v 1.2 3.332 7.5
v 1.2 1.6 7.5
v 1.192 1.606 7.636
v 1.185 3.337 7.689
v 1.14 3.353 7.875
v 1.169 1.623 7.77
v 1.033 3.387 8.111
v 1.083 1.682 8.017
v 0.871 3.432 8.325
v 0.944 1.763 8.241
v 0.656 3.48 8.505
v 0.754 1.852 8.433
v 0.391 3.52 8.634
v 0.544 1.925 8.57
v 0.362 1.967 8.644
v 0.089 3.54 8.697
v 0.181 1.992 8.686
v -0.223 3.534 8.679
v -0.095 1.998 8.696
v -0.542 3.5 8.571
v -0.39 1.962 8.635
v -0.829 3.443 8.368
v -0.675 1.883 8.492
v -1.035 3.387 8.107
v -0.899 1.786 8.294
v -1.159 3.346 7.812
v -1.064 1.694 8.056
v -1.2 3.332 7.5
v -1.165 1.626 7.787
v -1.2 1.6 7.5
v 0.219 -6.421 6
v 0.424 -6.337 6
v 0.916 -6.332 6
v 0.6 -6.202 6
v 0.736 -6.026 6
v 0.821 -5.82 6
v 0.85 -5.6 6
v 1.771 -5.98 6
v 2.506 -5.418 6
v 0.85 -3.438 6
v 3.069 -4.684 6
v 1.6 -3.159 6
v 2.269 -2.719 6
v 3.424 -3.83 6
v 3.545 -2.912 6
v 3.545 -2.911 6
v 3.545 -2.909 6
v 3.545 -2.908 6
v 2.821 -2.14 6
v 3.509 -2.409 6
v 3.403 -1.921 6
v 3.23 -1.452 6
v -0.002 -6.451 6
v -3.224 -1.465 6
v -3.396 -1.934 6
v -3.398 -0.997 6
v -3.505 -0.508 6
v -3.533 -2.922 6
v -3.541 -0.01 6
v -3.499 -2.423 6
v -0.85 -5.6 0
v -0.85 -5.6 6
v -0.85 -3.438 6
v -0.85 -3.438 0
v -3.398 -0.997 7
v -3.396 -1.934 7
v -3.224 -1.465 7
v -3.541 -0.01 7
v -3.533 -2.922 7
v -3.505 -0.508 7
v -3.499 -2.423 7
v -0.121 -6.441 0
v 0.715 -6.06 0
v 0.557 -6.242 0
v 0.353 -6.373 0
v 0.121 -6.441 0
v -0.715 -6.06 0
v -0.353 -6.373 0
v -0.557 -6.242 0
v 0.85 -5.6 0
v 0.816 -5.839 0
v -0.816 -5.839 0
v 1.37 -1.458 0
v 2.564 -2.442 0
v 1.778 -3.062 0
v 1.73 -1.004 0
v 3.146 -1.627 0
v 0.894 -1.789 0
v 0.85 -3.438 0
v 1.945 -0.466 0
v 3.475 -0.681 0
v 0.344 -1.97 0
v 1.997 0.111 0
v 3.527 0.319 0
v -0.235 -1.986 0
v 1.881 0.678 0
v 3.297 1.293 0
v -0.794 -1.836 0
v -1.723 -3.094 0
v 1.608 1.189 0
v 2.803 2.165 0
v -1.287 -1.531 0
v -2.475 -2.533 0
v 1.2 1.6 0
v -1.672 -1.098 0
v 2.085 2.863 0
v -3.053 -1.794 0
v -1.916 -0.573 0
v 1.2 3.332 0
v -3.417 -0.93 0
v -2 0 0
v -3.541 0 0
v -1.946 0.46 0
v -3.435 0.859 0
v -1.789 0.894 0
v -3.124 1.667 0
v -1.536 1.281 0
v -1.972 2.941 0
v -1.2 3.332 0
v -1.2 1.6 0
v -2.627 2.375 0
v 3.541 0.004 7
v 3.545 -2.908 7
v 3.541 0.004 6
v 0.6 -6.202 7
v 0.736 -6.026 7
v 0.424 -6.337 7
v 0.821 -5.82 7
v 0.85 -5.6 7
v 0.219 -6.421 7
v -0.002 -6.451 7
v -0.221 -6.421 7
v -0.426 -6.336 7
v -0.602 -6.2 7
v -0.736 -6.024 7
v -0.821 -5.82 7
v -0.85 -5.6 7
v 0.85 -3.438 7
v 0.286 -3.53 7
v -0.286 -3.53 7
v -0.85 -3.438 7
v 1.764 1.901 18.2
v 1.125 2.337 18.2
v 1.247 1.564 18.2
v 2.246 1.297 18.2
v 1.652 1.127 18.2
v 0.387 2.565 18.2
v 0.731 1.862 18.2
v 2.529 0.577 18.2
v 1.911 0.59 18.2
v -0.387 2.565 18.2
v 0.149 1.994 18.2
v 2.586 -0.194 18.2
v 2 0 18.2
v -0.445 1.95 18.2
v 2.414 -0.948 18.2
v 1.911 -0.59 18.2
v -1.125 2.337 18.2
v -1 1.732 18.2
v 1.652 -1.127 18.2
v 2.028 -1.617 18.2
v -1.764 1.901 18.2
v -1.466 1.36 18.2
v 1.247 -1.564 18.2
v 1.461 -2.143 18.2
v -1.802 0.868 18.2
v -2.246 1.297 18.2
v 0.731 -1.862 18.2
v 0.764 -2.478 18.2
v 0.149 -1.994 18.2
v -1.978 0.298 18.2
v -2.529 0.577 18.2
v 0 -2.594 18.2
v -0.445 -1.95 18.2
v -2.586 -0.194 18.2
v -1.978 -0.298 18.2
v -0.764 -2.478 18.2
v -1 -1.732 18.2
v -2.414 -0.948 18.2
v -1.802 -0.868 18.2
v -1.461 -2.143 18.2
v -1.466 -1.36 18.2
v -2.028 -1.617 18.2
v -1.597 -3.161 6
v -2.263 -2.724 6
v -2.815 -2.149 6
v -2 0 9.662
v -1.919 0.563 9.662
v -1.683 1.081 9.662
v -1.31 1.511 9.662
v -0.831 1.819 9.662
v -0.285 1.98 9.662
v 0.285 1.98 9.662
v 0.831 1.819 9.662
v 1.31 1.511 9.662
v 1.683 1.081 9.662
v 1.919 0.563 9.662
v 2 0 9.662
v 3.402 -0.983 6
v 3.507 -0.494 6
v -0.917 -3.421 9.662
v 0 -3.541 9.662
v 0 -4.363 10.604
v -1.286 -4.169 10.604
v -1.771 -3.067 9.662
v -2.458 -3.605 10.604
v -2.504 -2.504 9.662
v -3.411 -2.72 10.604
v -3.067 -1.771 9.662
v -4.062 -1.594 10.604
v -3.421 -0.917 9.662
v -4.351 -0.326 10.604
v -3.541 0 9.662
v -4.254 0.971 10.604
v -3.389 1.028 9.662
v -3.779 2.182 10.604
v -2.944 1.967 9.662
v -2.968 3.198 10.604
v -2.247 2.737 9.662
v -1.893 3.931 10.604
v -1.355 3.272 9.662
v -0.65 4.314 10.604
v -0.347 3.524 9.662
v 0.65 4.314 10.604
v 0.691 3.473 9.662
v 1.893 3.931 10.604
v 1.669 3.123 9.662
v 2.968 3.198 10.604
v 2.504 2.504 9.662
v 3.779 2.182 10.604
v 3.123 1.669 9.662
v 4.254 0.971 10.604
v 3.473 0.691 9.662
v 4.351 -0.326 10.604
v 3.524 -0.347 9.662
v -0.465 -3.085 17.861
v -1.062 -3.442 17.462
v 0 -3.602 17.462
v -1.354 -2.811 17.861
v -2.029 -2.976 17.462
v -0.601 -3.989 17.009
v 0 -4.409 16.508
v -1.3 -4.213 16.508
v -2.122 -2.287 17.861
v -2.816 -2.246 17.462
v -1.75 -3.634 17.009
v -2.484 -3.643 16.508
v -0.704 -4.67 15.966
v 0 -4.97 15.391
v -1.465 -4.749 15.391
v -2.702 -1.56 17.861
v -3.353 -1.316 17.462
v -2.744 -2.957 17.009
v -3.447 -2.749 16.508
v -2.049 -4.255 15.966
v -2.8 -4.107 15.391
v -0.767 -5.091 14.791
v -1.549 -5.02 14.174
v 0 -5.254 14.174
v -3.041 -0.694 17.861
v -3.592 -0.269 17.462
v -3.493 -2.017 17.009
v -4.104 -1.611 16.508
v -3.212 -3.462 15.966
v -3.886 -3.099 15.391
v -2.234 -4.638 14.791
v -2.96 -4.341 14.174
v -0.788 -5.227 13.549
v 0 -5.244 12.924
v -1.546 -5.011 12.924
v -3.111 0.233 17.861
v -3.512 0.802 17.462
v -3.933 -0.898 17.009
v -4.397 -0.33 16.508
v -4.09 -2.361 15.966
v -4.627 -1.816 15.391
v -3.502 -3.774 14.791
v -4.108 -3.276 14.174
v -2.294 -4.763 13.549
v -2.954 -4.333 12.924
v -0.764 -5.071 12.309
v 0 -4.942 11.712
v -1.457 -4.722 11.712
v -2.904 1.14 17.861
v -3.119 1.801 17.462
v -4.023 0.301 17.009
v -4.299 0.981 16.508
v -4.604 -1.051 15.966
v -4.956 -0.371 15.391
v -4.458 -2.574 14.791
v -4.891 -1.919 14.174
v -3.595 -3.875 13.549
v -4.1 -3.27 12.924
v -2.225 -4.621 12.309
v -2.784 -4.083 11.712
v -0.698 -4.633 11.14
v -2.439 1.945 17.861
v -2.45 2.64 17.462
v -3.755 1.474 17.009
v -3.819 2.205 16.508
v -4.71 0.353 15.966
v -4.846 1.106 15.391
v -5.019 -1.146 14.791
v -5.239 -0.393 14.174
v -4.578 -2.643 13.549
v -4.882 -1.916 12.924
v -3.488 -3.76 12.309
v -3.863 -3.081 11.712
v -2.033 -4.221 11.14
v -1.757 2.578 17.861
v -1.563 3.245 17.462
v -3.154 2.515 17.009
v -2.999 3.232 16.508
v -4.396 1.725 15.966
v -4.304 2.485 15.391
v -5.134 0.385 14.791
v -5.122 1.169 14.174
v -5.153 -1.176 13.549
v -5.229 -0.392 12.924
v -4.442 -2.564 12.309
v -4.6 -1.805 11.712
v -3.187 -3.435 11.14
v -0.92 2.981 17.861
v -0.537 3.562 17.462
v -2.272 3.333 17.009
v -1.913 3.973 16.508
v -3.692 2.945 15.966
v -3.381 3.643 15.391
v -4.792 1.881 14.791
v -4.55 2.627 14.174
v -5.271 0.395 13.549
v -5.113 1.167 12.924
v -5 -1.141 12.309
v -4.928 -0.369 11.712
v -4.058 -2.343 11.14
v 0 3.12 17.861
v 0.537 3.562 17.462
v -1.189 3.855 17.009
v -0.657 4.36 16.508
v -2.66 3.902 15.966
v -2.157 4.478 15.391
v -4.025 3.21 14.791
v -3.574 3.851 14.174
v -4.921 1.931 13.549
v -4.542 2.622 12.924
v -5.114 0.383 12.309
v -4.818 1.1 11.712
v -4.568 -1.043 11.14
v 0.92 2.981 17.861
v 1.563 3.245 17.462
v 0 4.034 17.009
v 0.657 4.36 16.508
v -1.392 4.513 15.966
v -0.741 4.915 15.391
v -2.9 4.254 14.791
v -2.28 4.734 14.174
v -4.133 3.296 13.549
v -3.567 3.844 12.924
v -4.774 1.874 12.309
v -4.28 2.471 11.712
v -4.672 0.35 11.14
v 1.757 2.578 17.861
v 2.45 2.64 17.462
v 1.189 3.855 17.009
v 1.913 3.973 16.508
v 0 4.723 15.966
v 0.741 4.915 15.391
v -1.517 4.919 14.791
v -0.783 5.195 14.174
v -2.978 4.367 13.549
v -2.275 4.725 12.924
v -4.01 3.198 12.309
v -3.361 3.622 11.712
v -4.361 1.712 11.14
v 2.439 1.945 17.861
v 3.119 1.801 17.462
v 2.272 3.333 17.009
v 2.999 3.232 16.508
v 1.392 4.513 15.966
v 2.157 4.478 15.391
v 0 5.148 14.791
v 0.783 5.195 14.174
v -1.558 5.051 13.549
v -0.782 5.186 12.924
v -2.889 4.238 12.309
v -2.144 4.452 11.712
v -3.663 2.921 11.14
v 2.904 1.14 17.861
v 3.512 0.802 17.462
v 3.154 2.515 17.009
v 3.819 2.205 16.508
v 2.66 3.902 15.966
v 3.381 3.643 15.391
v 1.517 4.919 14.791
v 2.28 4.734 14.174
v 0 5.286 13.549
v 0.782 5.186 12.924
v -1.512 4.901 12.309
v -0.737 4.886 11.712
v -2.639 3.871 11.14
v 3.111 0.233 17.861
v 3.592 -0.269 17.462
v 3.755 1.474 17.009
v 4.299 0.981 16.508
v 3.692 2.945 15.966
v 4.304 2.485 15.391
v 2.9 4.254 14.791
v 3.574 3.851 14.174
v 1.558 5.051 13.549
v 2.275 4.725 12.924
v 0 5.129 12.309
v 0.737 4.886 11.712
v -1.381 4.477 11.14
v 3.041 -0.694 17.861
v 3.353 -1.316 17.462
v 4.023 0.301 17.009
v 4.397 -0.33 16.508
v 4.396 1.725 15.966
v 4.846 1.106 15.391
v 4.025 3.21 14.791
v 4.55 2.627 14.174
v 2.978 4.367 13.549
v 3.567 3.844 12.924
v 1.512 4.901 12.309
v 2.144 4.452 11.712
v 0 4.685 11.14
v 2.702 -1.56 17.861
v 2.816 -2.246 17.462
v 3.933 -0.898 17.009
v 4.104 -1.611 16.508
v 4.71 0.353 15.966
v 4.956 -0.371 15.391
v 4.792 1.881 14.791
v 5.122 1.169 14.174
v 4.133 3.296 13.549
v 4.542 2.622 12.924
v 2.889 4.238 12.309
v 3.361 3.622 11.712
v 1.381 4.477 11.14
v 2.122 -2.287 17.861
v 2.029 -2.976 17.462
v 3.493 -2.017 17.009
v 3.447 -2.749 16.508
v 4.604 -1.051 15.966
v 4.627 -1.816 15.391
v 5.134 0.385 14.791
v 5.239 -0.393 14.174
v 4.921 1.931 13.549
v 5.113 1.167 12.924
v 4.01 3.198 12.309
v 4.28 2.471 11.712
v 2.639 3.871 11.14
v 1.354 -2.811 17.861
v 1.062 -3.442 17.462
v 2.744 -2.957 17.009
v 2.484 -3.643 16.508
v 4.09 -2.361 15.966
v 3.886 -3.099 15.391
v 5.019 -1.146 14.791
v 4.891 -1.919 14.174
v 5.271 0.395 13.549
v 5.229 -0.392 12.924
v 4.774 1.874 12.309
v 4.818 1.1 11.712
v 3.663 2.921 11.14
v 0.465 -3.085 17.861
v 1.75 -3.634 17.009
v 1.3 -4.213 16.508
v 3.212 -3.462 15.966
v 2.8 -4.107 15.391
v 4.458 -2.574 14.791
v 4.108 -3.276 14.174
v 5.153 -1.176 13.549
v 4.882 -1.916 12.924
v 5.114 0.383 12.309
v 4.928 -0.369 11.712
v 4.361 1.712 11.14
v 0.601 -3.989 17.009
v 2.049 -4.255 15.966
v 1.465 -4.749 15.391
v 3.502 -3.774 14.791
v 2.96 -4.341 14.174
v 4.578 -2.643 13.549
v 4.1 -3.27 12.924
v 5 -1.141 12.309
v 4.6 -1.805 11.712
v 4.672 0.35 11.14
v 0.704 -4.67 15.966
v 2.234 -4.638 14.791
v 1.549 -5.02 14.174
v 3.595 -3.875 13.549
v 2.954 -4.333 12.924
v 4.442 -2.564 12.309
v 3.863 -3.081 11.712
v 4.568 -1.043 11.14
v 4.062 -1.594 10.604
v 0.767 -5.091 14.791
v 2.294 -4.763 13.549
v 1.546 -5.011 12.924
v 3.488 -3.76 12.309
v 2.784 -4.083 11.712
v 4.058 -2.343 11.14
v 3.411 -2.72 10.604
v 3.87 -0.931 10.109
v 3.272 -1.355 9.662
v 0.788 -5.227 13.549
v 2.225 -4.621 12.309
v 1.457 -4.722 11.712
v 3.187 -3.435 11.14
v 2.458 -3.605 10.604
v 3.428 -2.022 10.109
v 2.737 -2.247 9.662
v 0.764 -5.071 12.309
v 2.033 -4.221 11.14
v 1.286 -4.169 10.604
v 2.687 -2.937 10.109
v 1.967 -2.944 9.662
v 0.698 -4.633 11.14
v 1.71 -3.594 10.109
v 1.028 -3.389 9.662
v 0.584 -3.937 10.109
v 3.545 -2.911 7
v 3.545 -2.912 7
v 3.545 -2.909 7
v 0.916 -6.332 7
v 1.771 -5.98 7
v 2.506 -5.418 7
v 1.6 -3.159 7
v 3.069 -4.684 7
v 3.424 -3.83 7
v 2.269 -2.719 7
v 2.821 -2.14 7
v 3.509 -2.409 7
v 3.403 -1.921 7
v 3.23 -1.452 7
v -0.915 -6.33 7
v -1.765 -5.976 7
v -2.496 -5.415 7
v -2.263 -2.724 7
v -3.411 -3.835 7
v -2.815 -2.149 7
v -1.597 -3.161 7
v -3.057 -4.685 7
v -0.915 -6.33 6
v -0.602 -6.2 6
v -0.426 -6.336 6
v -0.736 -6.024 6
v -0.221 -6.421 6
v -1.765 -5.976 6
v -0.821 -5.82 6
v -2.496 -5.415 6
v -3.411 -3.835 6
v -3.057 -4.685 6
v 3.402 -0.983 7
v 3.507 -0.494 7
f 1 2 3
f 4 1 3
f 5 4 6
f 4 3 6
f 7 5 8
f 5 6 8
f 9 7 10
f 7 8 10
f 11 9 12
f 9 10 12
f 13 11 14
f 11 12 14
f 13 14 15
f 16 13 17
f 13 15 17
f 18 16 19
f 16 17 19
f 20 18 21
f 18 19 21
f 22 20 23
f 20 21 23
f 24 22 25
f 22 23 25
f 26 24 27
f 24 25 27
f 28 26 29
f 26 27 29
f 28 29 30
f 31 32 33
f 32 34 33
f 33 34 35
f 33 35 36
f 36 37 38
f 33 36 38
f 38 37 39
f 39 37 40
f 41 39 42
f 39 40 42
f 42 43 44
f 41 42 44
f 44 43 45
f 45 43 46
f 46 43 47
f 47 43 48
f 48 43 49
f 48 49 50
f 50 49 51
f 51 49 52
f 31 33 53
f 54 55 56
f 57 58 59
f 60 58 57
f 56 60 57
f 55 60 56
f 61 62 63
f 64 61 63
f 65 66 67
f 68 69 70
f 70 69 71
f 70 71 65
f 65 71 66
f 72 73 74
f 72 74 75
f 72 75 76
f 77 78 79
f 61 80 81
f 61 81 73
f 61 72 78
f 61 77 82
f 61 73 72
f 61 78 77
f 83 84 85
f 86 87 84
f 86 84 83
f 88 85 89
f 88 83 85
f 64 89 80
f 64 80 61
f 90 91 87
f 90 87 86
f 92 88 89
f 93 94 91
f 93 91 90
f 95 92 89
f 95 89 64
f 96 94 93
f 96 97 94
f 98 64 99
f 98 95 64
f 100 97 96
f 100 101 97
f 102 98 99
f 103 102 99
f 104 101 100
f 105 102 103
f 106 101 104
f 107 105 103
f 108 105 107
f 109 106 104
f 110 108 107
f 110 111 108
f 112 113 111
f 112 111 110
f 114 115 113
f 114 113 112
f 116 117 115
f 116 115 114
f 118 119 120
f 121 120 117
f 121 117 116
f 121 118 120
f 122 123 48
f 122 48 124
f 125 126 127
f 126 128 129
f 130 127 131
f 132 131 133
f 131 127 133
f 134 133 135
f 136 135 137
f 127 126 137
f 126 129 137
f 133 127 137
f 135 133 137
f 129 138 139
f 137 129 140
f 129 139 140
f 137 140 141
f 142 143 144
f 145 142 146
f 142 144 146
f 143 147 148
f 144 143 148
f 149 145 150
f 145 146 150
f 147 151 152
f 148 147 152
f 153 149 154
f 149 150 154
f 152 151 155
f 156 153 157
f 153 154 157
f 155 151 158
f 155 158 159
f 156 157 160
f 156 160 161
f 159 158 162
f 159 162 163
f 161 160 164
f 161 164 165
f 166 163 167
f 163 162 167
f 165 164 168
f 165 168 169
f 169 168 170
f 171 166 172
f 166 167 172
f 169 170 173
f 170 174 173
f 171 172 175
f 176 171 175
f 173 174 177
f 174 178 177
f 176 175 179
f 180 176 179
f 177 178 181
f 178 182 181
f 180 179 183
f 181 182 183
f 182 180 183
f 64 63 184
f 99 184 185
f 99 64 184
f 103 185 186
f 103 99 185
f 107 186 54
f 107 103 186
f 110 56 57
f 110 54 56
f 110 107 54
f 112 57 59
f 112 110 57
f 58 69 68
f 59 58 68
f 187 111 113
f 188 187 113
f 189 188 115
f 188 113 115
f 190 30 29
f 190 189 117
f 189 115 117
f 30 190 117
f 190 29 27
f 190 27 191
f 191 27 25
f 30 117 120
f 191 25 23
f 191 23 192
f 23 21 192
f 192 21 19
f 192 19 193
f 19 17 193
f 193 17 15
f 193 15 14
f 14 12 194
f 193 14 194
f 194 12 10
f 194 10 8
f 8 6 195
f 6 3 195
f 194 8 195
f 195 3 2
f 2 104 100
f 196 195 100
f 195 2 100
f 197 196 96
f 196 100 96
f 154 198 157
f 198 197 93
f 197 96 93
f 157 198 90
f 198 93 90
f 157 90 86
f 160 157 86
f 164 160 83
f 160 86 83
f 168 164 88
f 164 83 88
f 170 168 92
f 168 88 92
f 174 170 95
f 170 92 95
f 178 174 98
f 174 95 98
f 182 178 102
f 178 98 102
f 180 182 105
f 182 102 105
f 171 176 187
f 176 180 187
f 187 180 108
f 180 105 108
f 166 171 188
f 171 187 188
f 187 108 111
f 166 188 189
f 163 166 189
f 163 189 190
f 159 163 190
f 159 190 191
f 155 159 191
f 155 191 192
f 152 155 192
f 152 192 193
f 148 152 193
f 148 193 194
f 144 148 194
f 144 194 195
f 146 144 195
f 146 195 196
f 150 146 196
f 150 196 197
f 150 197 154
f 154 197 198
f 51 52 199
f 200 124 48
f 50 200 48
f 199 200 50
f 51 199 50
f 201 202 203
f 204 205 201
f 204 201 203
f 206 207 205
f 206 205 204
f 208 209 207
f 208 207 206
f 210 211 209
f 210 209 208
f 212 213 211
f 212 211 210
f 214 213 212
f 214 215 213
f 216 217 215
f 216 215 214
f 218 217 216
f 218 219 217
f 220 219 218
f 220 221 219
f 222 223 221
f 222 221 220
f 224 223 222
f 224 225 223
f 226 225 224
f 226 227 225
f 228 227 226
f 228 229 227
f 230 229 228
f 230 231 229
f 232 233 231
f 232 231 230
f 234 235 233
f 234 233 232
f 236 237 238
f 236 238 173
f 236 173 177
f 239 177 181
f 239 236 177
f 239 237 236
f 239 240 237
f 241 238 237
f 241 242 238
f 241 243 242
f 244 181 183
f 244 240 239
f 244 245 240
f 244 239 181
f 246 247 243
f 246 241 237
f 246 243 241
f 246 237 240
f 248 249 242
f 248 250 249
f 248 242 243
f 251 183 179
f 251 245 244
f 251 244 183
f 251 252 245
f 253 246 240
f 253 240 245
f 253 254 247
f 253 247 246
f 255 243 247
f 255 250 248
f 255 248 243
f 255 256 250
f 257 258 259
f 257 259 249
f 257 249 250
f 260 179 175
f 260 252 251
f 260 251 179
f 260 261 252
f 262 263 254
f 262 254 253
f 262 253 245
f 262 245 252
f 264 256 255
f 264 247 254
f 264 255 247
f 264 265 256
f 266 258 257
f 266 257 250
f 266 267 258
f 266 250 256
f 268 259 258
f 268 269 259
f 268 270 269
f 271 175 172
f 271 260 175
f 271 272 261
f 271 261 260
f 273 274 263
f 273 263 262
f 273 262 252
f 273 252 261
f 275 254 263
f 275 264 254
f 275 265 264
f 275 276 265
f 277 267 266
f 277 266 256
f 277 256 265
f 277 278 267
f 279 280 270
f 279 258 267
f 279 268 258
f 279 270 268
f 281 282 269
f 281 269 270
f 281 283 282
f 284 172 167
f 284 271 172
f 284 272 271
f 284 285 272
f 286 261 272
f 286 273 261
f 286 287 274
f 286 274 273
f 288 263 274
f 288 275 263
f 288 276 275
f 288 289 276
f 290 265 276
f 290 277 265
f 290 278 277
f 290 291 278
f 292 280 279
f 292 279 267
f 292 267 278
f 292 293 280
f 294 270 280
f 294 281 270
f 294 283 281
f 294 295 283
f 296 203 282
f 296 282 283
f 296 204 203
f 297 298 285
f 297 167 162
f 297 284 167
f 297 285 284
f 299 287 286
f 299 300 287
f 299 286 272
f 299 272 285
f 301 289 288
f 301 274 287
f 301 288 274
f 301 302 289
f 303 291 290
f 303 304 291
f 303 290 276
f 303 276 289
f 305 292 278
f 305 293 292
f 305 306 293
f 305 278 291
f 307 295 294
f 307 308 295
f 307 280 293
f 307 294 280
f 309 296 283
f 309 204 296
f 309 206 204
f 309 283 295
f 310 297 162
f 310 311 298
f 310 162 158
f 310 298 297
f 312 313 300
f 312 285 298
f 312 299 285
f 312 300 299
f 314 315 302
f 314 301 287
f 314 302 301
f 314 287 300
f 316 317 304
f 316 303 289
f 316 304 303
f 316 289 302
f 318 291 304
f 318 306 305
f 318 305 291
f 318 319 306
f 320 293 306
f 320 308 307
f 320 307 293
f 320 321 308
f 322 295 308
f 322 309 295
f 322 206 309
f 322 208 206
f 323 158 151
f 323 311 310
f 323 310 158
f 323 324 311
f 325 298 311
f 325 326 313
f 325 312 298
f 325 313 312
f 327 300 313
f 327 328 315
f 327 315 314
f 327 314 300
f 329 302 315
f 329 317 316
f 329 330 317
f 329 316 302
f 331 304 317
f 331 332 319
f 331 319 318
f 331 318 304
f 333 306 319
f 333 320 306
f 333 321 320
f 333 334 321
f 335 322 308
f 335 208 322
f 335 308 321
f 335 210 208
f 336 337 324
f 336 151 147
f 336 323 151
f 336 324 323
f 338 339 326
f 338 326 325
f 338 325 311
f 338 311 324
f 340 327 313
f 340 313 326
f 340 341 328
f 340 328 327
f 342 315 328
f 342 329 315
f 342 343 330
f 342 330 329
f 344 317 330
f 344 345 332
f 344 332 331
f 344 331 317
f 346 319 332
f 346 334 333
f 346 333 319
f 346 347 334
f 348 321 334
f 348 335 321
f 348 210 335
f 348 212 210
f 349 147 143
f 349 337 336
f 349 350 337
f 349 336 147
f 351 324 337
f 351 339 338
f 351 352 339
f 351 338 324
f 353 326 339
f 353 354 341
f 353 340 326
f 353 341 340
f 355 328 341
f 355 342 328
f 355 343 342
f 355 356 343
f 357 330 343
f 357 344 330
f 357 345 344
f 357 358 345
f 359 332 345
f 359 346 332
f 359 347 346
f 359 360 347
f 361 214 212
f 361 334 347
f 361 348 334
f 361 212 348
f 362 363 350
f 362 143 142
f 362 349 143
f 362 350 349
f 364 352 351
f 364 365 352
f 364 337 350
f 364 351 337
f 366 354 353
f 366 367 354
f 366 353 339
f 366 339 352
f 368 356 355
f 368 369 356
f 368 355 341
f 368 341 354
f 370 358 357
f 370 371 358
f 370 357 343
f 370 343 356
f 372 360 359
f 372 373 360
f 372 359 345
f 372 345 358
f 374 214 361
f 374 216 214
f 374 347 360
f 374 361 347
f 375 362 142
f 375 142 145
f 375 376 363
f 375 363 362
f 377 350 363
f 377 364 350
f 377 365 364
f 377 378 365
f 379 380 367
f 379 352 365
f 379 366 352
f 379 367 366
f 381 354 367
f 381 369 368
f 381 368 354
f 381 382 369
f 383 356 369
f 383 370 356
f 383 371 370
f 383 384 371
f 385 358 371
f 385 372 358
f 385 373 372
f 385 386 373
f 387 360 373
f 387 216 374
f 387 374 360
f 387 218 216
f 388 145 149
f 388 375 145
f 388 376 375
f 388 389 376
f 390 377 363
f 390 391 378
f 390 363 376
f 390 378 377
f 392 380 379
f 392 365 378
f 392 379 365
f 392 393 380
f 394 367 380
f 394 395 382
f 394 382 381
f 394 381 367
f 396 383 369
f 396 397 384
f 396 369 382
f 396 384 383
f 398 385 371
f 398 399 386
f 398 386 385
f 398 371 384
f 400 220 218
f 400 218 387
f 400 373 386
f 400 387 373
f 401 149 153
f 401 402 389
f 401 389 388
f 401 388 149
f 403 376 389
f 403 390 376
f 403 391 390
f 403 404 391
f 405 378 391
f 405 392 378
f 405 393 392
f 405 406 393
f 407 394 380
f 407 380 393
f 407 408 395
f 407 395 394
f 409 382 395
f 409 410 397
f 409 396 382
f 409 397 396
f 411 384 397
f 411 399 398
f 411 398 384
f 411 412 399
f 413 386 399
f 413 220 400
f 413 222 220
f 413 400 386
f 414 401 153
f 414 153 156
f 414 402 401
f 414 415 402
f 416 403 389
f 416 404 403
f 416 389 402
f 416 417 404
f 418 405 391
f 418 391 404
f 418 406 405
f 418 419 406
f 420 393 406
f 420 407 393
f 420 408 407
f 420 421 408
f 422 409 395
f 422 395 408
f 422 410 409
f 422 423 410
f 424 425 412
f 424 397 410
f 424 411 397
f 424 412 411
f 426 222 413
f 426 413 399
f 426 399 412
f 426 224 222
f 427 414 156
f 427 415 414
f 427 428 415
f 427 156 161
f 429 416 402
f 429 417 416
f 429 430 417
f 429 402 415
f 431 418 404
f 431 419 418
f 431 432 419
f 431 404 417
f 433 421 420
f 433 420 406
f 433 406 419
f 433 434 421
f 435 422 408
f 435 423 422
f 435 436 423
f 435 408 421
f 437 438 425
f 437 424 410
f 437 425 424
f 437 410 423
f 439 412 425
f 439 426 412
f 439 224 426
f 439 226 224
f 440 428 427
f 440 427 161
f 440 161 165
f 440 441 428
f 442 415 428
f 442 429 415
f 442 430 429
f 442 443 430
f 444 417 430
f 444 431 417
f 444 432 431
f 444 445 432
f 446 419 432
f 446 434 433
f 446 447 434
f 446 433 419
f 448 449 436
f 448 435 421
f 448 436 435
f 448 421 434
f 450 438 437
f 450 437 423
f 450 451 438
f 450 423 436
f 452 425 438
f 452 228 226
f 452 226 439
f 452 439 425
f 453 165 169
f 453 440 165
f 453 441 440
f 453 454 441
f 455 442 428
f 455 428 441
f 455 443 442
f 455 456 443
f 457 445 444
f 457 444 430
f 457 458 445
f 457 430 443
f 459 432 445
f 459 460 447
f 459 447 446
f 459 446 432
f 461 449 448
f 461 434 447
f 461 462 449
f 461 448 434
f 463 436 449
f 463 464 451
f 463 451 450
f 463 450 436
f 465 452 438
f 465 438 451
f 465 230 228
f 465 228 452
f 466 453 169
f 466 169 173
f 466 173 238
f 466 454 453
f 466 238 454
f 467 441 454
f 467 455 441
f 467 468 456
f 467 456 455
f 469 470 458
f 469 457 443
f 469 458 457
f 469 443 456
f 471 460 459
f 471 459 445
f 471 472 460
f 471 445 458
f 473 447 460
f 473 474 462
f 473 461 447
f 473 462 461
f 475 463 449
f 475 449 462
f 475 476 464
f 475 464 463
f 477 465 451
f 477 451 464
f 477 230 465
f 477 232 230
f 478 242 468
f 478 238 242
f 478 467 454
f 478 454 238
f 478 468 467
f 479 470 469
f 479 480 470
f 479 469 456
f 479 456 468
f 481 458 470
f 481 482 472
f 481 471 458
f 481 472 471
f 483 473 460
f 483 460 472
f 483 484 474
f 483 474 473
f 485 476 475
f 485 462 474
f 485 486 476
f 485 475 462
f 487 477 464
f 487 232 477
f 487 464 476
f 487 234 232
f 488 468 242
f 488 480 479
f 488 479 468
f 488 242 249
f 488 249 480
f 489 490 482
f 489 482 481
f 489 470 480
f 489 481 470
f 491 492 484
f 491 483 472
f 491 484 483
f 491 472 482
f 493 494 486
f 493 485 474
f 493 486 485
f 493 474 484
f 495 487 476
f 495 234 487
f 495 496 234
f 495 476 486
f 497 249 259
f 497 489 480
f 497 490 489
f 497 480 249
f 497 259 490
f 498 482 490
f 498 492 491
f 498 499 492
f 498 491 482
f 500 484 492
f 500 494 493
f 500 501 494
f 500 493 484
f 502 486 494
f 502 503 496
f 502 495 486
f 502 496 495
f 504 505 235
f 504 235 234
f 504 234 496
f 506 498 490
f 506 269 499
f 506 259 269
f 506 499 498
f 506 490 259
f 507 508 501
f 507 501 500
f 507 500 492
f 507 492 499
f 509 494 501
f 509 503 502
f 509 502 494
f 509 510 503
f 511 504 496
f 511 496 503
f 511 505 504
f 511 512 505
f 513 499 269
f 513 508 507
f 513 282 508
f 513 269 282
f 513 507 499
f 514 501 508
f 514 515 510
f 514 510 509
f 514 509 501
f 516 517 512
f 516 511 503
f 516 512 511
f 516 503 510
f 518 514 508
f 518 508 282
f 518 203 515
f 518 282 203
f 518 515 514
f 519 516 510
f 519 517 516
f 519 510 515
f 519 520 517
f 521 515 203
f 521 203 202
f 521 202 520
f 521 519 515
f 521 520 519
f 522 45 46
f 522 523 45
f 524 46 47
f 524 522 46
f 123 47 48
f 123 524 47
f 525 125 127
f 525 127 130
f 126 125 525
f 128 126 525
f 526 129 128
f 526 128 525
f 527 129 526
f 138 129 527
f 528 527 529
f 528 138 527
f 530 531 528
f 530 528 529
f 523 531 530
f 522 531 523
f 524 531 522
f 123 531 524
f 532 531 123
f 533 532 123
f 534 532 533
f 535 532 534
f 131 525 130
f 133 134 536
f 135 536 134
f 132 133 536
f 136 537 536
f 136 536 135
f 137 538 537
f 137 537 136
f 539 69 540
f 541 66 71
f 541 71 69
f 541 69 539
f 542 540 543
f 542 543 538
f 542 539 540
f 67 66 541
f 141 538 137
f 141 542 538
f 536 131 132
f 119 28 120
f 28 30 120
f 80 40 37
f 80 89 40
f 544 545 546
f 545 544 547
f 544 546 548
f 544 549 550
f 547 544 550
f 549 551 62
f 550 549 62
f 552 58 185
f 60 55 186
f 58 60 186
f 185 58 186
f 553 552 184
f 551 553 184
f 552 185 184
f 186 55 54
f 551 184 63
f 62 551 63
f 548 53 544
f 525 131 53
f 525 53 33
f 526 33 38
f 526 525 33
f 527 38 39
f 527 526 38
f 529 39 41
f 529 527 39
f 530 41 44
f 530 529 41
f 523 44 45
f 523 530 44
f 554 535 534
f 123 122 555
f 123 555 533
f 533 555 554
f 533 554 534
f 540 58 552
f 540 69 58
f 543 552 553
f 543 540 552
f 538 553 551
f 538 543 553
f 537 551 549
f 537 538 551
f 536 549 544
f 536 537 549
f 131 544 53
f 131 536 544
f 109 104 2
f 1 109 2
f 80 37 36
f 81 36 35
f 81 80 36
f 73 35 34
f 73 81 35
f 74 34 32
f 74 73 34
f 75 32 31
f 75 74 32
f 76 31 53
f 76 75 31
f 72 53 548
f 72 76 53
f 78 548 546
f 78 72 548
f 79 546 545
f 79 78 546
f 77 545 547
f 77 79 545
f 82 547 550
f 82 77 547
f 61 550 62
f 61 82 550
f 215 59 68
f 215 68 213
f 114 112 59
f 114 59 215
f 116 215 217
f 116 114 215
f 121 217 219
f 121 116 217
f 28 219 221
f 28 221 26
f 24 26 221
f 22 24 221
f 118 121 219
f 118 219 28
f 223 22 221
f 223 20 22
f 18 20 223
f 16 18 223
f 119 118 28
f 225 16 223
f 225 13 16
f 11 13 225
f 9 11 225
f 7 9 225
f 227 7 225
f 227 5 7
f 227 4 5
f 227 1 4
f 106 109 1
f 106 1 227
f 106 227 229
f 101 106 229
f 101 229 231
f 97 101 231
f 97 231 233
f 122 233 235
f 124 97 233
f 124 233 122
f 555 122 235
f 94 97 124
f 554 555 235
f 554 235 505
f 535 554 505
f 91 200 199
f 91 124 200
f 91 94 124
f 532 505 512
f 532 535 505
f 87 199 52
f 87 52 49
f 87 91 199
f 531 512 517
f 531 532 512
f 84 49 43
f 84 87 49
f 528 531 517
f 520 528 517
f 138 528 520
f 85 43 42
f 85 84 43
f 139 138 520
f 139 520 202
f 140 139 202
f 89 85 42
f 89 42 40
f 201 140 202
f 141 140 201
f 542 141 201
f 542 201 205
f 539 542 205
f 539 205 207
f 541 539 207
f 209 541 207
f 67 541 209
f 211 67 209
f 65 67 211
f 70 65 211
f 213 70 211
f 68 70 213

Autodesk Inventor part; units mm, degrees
ref_plane "YZ Plane" through (0, 0, 0) normal (1, 0, 0) x (0, 1, 0)
ref_plane "XY Plane" through (0, 0, 0) normal (0, 0, 1) x (1, 0, 0)
sketch "Náčrt2" plane through (0, 0, 0) normal (1, 0, 0) x (0, 1, 0)
  line L0 (-2.5936, 18.2) -> (2.6216, 18.2) projected
  line L1 (-6.458, 6.9989) -> (0.6548, 6.9989) projected
  line L2 (-3.5412, 9.6623) -> (3.7182, 9.6623) projected
  line L3 (0, 18.2) -> (0, 9.6623)
  arc A0 (-2.5936, 18.2) -> (-3.5412, 9.6623) centre (0.0066, 13.59) ccw
  line L4 (0, 18.2) -> (0, 0)
revolve "Rotace1" add sketch "Náčrt2" angle 360 about axis through (0, 0, 18.2) along (0, 0, -1)
sketch "Náčrt3" plane through (0, 0, 18.2) normal (0, 0, 1) x (1, 0, 0)
  circle A0 centre (0, 0) radius 2
  dimension "d1" = 4
extrude "Vysunutí1" cut sketch "Náčrt3" against normal blind 10
sketch "Náčrt4" plane through (-3.5364, -0.0875, 0) normal (0, 0, -1) x (-1, 0, 0)
  circle A0 centre (-3.5364, 0.0875) radius 3.5412 projected
  circle A1 centre (-3.5364, 0.0875) radius 2 projected
  line L0 (-2.6864, -5.5125) -> (-2.6864, -3.3464) projected
  circle A2 centre (-3.5364, -5.5125) radius 0.85 projected
  line L1 (-4.3864, -3.3464) -> (-4.3864, -5.5125) projected
  point P0 (-3.5364, 0.0875)
  point P1 (-4.3864, -3.3502)
  point P2 (-2.6864, -3.3502)
extrude "Vysunutí2" add sketch "Náčrt4" against normal blind 10 contours A0
sketch "Náčrt5" plane through (-3.5364, -0.0875, 0) normal (0, 0, -1) x (-1, 0, 0)
  point P0 (-3.5364, 0.0875)
extrude "Vysunutí3" add sketch "Náčrt4" against normal blind 7 contours A0 L0 A2 L1 | A2
sketch "Náčrt6" plane through (0, 0, 0) normal (0, 1, 0) x (-1, 0, 0)
  line L0 (0, 0) -> (-1.2, 0)
  line L1 (2, 0) -> (-2, 0) projected
  line L2 (-1.2, 0) -> (-1.2, 7.5)
  line L3 (-1.2, 7.5) -> (1.2, 7.5)
  line L4 (1.2, 7.5) -> (1.2, 0)
  arc A0 (1.2, 7.5) -> (-1.2, 7.5) centre (0, 7.5) ccw
  line L5 (0, 0) -> (1.2, 0)
  line L6 (-1.2, 7.5) -> (1.2, 7.5)
  line L7 (-1.2, 0) -> (1.2, 0)
  line L8 (1.2, 7.5) -> (1.2, 0)
  line L9 (1.2, 7.5) -> (-1.2, 7.5)
  line L10 (-1.2, 7.5) -> (-1.2, 0)
  dimension "d11" = 1.2
  dimension "d12" = 7.5
  dimension "d13" = 2.4
ref_plane "Pracovní rovina1" through (0, 2.75, 0) normal (0, 1, 0) x (-1, 0, 0)
sketch "Náčrt7" plane through (0, 0, 0) normal (0, 1, 0) x (-1, 0, 0)
  line L0 (1.2, 7.447) -> (1.2, 0) projected
  line L1 (-1.2, 7.447) -> (1.2041, 7.447)
  line L2 (1.2041, 7.447) -> (1.2041, 7.4445)
  line L3 (-1.2, 7.4445) -> (-1.2, 7.447)
  line L4 (1.2, 7.4445) -> (1.2, 0)
  line L5 (1.2, 0) -> (-1.2, 0)
  ellipse E0 centre (0.0021, 7.4458) end of major axis (0.0038, 9.0631) minor radius 1.2021 (1.2041, 7.4445) -> (-1.2, 7.4355) ccw
  line L6 (1.2, 7.4445) -> (1.2, 7.447)
  line L7 (1.2, 7.447) -> (-1.2, 7.447)
  line L8 (-1.2, 7.447) -> (-1.2, 7.4445)
  line L9 (-1.2, 0) -> (1.2041, 0)
  line L10 (1.2041, 0) -> (1.2041, 7.447)
  line L11 (1.2041, 7.447) -> (-1.2, 7.447)
  line L12 (-1.2, 7.447) -> (-1.2, 0)
  point P0 (0, 0)
  dimension "d9" = 2.4
  dimension "d10" = 7.447
extrude "Vysunutí4" cut sketch "Náčrt6" along normal blind 10
sketch "Náčrt8" plane through (-3.5364, -0.0875, 7) normal (0, 0, 1) x (1, 0, 0)
  arc A0 (2.6864, -5.5125) -> (4.3864, -5.5125) centre (3.5364, -5.5125) ccw projected
  line L0 (2.6864, -3.3502) -> (2.6864, -5.5125) projected
  line L1 (4.3864, -5.5125) -> (4.3864, -3.3502) projected
  arc A1 (4.3864, -3.3502) -> (2.6864, -3.3502) centre (3.5364, 0.0875) ccw projected
  arc A2 (4.3864, -3.3502) -> (4.7364, 3.4192) centre (3.5364, 0.0875) ccw projected
  arc A3 (2.3364, 1.6875) -> (4.7364, 1.6875) centre (3.5364, 0.0875) ccw projected
  circle A4 centre (3.5422, -2.8248) radius 3.5391 projected
  line L2 (4.3864, -3.3502) -> (4.3864, -5.5125) projected
  arc A5 (2.6864, -5.5125) -> (4.3864, -5.5125) centre (3.5364, -5.5125) ccw projected
  line L3 (2.6864, -5.5125) -> (2.6864, -3.3502) projected
  line L4 (7.0813, -2.8203) -> (7.0776, 0.092)
  line L5 (0.003, -2.8342) -> (-0.0048, 0.078)
  line L6 (2.6864, -5.5125) -> (2.6864, -3.3502) projected
  arc A6 (2.6864, -5.5125) -> (4.3864, -5.5125) centre (3.5364, -5.5125) ccw projected
  arc A7 (2.3364, 3.4192) -> (2.6864, -3.3502) centre (3.5364, 0.0875) ccw projected
  line L7 (4.3864, -3.3502) -> (4.3864, -5.5125) projected
  arc A8 (2.6864, -5.5125) -> (4.3864, -5.5125) centre (3.5364, -5.5125) ccw projected
  line L8 (2.6864, -5.5125) -> (2.6864, -3.3502) projected
  arc A9 (2.3364, 1.6875) -> (4.7364, 1.6875) centre (3.5364, 0.0875) ccw projected
  line L9 (4.7364, 1.6875) -> (4.7364, 3.4192) projected
  arc A10 (4.3864, -3.3502) -> (4.7364, 3.4192) centre (3.5364, 0.0875) ccw projected
  line L10 (2.3364, 3.4192) -> (2.3364, 1.6875) projected
  line L11 (4.7364, 1.6875) -> (4.7364, 3.4192) projected
  arc A11 (2.3364, 3.4192) -> (2.6864, -3.3502) centre (3.5364, 0.0875) ccw projected
  line L12 (2.3364, 3.4192) -> (2.3364, 1.6875) projected
  point P0 (3.5364, 0.0875)
  point P1 (7.0776, 0.092)
  point P2 (-0.0048, 0.078)
extrude "Vysunutí5" add sketch "Náčrt8" against normal blind 1 contours A0 A4 A1 L0 | A0 L1 A1 A4 | L5 A1 A4 | A4 A1 L4
sketch "Náčrt9" plane through (-3.5364, -0.0875, 0) normal (0, 0, -1) x (-1, 0, 0)
  circle A0 centre (-3.5364, 0.0875) radius 2
  circle A1 centre (-3.5364, 0.0875) radius 3.5412
  circle A2 centre (-3.5364, -5.5125) radius 0.85
  line L0 (-4.3864, -5.5125) -> (-4.3864, -3.3502)
  line L1 (-2.6864, -5.5125) -> (-2.6864, -3.3502)
  line L2 (-4.7364, 1.6875) -> (-4.7364, 3.4192)
  line L3 (-2.3364, 1.6875) -> (-2.3364, 3.4192)
  point P0 (-3.5364, 0.0875)
properties part number "New_11_Base_Joint"
